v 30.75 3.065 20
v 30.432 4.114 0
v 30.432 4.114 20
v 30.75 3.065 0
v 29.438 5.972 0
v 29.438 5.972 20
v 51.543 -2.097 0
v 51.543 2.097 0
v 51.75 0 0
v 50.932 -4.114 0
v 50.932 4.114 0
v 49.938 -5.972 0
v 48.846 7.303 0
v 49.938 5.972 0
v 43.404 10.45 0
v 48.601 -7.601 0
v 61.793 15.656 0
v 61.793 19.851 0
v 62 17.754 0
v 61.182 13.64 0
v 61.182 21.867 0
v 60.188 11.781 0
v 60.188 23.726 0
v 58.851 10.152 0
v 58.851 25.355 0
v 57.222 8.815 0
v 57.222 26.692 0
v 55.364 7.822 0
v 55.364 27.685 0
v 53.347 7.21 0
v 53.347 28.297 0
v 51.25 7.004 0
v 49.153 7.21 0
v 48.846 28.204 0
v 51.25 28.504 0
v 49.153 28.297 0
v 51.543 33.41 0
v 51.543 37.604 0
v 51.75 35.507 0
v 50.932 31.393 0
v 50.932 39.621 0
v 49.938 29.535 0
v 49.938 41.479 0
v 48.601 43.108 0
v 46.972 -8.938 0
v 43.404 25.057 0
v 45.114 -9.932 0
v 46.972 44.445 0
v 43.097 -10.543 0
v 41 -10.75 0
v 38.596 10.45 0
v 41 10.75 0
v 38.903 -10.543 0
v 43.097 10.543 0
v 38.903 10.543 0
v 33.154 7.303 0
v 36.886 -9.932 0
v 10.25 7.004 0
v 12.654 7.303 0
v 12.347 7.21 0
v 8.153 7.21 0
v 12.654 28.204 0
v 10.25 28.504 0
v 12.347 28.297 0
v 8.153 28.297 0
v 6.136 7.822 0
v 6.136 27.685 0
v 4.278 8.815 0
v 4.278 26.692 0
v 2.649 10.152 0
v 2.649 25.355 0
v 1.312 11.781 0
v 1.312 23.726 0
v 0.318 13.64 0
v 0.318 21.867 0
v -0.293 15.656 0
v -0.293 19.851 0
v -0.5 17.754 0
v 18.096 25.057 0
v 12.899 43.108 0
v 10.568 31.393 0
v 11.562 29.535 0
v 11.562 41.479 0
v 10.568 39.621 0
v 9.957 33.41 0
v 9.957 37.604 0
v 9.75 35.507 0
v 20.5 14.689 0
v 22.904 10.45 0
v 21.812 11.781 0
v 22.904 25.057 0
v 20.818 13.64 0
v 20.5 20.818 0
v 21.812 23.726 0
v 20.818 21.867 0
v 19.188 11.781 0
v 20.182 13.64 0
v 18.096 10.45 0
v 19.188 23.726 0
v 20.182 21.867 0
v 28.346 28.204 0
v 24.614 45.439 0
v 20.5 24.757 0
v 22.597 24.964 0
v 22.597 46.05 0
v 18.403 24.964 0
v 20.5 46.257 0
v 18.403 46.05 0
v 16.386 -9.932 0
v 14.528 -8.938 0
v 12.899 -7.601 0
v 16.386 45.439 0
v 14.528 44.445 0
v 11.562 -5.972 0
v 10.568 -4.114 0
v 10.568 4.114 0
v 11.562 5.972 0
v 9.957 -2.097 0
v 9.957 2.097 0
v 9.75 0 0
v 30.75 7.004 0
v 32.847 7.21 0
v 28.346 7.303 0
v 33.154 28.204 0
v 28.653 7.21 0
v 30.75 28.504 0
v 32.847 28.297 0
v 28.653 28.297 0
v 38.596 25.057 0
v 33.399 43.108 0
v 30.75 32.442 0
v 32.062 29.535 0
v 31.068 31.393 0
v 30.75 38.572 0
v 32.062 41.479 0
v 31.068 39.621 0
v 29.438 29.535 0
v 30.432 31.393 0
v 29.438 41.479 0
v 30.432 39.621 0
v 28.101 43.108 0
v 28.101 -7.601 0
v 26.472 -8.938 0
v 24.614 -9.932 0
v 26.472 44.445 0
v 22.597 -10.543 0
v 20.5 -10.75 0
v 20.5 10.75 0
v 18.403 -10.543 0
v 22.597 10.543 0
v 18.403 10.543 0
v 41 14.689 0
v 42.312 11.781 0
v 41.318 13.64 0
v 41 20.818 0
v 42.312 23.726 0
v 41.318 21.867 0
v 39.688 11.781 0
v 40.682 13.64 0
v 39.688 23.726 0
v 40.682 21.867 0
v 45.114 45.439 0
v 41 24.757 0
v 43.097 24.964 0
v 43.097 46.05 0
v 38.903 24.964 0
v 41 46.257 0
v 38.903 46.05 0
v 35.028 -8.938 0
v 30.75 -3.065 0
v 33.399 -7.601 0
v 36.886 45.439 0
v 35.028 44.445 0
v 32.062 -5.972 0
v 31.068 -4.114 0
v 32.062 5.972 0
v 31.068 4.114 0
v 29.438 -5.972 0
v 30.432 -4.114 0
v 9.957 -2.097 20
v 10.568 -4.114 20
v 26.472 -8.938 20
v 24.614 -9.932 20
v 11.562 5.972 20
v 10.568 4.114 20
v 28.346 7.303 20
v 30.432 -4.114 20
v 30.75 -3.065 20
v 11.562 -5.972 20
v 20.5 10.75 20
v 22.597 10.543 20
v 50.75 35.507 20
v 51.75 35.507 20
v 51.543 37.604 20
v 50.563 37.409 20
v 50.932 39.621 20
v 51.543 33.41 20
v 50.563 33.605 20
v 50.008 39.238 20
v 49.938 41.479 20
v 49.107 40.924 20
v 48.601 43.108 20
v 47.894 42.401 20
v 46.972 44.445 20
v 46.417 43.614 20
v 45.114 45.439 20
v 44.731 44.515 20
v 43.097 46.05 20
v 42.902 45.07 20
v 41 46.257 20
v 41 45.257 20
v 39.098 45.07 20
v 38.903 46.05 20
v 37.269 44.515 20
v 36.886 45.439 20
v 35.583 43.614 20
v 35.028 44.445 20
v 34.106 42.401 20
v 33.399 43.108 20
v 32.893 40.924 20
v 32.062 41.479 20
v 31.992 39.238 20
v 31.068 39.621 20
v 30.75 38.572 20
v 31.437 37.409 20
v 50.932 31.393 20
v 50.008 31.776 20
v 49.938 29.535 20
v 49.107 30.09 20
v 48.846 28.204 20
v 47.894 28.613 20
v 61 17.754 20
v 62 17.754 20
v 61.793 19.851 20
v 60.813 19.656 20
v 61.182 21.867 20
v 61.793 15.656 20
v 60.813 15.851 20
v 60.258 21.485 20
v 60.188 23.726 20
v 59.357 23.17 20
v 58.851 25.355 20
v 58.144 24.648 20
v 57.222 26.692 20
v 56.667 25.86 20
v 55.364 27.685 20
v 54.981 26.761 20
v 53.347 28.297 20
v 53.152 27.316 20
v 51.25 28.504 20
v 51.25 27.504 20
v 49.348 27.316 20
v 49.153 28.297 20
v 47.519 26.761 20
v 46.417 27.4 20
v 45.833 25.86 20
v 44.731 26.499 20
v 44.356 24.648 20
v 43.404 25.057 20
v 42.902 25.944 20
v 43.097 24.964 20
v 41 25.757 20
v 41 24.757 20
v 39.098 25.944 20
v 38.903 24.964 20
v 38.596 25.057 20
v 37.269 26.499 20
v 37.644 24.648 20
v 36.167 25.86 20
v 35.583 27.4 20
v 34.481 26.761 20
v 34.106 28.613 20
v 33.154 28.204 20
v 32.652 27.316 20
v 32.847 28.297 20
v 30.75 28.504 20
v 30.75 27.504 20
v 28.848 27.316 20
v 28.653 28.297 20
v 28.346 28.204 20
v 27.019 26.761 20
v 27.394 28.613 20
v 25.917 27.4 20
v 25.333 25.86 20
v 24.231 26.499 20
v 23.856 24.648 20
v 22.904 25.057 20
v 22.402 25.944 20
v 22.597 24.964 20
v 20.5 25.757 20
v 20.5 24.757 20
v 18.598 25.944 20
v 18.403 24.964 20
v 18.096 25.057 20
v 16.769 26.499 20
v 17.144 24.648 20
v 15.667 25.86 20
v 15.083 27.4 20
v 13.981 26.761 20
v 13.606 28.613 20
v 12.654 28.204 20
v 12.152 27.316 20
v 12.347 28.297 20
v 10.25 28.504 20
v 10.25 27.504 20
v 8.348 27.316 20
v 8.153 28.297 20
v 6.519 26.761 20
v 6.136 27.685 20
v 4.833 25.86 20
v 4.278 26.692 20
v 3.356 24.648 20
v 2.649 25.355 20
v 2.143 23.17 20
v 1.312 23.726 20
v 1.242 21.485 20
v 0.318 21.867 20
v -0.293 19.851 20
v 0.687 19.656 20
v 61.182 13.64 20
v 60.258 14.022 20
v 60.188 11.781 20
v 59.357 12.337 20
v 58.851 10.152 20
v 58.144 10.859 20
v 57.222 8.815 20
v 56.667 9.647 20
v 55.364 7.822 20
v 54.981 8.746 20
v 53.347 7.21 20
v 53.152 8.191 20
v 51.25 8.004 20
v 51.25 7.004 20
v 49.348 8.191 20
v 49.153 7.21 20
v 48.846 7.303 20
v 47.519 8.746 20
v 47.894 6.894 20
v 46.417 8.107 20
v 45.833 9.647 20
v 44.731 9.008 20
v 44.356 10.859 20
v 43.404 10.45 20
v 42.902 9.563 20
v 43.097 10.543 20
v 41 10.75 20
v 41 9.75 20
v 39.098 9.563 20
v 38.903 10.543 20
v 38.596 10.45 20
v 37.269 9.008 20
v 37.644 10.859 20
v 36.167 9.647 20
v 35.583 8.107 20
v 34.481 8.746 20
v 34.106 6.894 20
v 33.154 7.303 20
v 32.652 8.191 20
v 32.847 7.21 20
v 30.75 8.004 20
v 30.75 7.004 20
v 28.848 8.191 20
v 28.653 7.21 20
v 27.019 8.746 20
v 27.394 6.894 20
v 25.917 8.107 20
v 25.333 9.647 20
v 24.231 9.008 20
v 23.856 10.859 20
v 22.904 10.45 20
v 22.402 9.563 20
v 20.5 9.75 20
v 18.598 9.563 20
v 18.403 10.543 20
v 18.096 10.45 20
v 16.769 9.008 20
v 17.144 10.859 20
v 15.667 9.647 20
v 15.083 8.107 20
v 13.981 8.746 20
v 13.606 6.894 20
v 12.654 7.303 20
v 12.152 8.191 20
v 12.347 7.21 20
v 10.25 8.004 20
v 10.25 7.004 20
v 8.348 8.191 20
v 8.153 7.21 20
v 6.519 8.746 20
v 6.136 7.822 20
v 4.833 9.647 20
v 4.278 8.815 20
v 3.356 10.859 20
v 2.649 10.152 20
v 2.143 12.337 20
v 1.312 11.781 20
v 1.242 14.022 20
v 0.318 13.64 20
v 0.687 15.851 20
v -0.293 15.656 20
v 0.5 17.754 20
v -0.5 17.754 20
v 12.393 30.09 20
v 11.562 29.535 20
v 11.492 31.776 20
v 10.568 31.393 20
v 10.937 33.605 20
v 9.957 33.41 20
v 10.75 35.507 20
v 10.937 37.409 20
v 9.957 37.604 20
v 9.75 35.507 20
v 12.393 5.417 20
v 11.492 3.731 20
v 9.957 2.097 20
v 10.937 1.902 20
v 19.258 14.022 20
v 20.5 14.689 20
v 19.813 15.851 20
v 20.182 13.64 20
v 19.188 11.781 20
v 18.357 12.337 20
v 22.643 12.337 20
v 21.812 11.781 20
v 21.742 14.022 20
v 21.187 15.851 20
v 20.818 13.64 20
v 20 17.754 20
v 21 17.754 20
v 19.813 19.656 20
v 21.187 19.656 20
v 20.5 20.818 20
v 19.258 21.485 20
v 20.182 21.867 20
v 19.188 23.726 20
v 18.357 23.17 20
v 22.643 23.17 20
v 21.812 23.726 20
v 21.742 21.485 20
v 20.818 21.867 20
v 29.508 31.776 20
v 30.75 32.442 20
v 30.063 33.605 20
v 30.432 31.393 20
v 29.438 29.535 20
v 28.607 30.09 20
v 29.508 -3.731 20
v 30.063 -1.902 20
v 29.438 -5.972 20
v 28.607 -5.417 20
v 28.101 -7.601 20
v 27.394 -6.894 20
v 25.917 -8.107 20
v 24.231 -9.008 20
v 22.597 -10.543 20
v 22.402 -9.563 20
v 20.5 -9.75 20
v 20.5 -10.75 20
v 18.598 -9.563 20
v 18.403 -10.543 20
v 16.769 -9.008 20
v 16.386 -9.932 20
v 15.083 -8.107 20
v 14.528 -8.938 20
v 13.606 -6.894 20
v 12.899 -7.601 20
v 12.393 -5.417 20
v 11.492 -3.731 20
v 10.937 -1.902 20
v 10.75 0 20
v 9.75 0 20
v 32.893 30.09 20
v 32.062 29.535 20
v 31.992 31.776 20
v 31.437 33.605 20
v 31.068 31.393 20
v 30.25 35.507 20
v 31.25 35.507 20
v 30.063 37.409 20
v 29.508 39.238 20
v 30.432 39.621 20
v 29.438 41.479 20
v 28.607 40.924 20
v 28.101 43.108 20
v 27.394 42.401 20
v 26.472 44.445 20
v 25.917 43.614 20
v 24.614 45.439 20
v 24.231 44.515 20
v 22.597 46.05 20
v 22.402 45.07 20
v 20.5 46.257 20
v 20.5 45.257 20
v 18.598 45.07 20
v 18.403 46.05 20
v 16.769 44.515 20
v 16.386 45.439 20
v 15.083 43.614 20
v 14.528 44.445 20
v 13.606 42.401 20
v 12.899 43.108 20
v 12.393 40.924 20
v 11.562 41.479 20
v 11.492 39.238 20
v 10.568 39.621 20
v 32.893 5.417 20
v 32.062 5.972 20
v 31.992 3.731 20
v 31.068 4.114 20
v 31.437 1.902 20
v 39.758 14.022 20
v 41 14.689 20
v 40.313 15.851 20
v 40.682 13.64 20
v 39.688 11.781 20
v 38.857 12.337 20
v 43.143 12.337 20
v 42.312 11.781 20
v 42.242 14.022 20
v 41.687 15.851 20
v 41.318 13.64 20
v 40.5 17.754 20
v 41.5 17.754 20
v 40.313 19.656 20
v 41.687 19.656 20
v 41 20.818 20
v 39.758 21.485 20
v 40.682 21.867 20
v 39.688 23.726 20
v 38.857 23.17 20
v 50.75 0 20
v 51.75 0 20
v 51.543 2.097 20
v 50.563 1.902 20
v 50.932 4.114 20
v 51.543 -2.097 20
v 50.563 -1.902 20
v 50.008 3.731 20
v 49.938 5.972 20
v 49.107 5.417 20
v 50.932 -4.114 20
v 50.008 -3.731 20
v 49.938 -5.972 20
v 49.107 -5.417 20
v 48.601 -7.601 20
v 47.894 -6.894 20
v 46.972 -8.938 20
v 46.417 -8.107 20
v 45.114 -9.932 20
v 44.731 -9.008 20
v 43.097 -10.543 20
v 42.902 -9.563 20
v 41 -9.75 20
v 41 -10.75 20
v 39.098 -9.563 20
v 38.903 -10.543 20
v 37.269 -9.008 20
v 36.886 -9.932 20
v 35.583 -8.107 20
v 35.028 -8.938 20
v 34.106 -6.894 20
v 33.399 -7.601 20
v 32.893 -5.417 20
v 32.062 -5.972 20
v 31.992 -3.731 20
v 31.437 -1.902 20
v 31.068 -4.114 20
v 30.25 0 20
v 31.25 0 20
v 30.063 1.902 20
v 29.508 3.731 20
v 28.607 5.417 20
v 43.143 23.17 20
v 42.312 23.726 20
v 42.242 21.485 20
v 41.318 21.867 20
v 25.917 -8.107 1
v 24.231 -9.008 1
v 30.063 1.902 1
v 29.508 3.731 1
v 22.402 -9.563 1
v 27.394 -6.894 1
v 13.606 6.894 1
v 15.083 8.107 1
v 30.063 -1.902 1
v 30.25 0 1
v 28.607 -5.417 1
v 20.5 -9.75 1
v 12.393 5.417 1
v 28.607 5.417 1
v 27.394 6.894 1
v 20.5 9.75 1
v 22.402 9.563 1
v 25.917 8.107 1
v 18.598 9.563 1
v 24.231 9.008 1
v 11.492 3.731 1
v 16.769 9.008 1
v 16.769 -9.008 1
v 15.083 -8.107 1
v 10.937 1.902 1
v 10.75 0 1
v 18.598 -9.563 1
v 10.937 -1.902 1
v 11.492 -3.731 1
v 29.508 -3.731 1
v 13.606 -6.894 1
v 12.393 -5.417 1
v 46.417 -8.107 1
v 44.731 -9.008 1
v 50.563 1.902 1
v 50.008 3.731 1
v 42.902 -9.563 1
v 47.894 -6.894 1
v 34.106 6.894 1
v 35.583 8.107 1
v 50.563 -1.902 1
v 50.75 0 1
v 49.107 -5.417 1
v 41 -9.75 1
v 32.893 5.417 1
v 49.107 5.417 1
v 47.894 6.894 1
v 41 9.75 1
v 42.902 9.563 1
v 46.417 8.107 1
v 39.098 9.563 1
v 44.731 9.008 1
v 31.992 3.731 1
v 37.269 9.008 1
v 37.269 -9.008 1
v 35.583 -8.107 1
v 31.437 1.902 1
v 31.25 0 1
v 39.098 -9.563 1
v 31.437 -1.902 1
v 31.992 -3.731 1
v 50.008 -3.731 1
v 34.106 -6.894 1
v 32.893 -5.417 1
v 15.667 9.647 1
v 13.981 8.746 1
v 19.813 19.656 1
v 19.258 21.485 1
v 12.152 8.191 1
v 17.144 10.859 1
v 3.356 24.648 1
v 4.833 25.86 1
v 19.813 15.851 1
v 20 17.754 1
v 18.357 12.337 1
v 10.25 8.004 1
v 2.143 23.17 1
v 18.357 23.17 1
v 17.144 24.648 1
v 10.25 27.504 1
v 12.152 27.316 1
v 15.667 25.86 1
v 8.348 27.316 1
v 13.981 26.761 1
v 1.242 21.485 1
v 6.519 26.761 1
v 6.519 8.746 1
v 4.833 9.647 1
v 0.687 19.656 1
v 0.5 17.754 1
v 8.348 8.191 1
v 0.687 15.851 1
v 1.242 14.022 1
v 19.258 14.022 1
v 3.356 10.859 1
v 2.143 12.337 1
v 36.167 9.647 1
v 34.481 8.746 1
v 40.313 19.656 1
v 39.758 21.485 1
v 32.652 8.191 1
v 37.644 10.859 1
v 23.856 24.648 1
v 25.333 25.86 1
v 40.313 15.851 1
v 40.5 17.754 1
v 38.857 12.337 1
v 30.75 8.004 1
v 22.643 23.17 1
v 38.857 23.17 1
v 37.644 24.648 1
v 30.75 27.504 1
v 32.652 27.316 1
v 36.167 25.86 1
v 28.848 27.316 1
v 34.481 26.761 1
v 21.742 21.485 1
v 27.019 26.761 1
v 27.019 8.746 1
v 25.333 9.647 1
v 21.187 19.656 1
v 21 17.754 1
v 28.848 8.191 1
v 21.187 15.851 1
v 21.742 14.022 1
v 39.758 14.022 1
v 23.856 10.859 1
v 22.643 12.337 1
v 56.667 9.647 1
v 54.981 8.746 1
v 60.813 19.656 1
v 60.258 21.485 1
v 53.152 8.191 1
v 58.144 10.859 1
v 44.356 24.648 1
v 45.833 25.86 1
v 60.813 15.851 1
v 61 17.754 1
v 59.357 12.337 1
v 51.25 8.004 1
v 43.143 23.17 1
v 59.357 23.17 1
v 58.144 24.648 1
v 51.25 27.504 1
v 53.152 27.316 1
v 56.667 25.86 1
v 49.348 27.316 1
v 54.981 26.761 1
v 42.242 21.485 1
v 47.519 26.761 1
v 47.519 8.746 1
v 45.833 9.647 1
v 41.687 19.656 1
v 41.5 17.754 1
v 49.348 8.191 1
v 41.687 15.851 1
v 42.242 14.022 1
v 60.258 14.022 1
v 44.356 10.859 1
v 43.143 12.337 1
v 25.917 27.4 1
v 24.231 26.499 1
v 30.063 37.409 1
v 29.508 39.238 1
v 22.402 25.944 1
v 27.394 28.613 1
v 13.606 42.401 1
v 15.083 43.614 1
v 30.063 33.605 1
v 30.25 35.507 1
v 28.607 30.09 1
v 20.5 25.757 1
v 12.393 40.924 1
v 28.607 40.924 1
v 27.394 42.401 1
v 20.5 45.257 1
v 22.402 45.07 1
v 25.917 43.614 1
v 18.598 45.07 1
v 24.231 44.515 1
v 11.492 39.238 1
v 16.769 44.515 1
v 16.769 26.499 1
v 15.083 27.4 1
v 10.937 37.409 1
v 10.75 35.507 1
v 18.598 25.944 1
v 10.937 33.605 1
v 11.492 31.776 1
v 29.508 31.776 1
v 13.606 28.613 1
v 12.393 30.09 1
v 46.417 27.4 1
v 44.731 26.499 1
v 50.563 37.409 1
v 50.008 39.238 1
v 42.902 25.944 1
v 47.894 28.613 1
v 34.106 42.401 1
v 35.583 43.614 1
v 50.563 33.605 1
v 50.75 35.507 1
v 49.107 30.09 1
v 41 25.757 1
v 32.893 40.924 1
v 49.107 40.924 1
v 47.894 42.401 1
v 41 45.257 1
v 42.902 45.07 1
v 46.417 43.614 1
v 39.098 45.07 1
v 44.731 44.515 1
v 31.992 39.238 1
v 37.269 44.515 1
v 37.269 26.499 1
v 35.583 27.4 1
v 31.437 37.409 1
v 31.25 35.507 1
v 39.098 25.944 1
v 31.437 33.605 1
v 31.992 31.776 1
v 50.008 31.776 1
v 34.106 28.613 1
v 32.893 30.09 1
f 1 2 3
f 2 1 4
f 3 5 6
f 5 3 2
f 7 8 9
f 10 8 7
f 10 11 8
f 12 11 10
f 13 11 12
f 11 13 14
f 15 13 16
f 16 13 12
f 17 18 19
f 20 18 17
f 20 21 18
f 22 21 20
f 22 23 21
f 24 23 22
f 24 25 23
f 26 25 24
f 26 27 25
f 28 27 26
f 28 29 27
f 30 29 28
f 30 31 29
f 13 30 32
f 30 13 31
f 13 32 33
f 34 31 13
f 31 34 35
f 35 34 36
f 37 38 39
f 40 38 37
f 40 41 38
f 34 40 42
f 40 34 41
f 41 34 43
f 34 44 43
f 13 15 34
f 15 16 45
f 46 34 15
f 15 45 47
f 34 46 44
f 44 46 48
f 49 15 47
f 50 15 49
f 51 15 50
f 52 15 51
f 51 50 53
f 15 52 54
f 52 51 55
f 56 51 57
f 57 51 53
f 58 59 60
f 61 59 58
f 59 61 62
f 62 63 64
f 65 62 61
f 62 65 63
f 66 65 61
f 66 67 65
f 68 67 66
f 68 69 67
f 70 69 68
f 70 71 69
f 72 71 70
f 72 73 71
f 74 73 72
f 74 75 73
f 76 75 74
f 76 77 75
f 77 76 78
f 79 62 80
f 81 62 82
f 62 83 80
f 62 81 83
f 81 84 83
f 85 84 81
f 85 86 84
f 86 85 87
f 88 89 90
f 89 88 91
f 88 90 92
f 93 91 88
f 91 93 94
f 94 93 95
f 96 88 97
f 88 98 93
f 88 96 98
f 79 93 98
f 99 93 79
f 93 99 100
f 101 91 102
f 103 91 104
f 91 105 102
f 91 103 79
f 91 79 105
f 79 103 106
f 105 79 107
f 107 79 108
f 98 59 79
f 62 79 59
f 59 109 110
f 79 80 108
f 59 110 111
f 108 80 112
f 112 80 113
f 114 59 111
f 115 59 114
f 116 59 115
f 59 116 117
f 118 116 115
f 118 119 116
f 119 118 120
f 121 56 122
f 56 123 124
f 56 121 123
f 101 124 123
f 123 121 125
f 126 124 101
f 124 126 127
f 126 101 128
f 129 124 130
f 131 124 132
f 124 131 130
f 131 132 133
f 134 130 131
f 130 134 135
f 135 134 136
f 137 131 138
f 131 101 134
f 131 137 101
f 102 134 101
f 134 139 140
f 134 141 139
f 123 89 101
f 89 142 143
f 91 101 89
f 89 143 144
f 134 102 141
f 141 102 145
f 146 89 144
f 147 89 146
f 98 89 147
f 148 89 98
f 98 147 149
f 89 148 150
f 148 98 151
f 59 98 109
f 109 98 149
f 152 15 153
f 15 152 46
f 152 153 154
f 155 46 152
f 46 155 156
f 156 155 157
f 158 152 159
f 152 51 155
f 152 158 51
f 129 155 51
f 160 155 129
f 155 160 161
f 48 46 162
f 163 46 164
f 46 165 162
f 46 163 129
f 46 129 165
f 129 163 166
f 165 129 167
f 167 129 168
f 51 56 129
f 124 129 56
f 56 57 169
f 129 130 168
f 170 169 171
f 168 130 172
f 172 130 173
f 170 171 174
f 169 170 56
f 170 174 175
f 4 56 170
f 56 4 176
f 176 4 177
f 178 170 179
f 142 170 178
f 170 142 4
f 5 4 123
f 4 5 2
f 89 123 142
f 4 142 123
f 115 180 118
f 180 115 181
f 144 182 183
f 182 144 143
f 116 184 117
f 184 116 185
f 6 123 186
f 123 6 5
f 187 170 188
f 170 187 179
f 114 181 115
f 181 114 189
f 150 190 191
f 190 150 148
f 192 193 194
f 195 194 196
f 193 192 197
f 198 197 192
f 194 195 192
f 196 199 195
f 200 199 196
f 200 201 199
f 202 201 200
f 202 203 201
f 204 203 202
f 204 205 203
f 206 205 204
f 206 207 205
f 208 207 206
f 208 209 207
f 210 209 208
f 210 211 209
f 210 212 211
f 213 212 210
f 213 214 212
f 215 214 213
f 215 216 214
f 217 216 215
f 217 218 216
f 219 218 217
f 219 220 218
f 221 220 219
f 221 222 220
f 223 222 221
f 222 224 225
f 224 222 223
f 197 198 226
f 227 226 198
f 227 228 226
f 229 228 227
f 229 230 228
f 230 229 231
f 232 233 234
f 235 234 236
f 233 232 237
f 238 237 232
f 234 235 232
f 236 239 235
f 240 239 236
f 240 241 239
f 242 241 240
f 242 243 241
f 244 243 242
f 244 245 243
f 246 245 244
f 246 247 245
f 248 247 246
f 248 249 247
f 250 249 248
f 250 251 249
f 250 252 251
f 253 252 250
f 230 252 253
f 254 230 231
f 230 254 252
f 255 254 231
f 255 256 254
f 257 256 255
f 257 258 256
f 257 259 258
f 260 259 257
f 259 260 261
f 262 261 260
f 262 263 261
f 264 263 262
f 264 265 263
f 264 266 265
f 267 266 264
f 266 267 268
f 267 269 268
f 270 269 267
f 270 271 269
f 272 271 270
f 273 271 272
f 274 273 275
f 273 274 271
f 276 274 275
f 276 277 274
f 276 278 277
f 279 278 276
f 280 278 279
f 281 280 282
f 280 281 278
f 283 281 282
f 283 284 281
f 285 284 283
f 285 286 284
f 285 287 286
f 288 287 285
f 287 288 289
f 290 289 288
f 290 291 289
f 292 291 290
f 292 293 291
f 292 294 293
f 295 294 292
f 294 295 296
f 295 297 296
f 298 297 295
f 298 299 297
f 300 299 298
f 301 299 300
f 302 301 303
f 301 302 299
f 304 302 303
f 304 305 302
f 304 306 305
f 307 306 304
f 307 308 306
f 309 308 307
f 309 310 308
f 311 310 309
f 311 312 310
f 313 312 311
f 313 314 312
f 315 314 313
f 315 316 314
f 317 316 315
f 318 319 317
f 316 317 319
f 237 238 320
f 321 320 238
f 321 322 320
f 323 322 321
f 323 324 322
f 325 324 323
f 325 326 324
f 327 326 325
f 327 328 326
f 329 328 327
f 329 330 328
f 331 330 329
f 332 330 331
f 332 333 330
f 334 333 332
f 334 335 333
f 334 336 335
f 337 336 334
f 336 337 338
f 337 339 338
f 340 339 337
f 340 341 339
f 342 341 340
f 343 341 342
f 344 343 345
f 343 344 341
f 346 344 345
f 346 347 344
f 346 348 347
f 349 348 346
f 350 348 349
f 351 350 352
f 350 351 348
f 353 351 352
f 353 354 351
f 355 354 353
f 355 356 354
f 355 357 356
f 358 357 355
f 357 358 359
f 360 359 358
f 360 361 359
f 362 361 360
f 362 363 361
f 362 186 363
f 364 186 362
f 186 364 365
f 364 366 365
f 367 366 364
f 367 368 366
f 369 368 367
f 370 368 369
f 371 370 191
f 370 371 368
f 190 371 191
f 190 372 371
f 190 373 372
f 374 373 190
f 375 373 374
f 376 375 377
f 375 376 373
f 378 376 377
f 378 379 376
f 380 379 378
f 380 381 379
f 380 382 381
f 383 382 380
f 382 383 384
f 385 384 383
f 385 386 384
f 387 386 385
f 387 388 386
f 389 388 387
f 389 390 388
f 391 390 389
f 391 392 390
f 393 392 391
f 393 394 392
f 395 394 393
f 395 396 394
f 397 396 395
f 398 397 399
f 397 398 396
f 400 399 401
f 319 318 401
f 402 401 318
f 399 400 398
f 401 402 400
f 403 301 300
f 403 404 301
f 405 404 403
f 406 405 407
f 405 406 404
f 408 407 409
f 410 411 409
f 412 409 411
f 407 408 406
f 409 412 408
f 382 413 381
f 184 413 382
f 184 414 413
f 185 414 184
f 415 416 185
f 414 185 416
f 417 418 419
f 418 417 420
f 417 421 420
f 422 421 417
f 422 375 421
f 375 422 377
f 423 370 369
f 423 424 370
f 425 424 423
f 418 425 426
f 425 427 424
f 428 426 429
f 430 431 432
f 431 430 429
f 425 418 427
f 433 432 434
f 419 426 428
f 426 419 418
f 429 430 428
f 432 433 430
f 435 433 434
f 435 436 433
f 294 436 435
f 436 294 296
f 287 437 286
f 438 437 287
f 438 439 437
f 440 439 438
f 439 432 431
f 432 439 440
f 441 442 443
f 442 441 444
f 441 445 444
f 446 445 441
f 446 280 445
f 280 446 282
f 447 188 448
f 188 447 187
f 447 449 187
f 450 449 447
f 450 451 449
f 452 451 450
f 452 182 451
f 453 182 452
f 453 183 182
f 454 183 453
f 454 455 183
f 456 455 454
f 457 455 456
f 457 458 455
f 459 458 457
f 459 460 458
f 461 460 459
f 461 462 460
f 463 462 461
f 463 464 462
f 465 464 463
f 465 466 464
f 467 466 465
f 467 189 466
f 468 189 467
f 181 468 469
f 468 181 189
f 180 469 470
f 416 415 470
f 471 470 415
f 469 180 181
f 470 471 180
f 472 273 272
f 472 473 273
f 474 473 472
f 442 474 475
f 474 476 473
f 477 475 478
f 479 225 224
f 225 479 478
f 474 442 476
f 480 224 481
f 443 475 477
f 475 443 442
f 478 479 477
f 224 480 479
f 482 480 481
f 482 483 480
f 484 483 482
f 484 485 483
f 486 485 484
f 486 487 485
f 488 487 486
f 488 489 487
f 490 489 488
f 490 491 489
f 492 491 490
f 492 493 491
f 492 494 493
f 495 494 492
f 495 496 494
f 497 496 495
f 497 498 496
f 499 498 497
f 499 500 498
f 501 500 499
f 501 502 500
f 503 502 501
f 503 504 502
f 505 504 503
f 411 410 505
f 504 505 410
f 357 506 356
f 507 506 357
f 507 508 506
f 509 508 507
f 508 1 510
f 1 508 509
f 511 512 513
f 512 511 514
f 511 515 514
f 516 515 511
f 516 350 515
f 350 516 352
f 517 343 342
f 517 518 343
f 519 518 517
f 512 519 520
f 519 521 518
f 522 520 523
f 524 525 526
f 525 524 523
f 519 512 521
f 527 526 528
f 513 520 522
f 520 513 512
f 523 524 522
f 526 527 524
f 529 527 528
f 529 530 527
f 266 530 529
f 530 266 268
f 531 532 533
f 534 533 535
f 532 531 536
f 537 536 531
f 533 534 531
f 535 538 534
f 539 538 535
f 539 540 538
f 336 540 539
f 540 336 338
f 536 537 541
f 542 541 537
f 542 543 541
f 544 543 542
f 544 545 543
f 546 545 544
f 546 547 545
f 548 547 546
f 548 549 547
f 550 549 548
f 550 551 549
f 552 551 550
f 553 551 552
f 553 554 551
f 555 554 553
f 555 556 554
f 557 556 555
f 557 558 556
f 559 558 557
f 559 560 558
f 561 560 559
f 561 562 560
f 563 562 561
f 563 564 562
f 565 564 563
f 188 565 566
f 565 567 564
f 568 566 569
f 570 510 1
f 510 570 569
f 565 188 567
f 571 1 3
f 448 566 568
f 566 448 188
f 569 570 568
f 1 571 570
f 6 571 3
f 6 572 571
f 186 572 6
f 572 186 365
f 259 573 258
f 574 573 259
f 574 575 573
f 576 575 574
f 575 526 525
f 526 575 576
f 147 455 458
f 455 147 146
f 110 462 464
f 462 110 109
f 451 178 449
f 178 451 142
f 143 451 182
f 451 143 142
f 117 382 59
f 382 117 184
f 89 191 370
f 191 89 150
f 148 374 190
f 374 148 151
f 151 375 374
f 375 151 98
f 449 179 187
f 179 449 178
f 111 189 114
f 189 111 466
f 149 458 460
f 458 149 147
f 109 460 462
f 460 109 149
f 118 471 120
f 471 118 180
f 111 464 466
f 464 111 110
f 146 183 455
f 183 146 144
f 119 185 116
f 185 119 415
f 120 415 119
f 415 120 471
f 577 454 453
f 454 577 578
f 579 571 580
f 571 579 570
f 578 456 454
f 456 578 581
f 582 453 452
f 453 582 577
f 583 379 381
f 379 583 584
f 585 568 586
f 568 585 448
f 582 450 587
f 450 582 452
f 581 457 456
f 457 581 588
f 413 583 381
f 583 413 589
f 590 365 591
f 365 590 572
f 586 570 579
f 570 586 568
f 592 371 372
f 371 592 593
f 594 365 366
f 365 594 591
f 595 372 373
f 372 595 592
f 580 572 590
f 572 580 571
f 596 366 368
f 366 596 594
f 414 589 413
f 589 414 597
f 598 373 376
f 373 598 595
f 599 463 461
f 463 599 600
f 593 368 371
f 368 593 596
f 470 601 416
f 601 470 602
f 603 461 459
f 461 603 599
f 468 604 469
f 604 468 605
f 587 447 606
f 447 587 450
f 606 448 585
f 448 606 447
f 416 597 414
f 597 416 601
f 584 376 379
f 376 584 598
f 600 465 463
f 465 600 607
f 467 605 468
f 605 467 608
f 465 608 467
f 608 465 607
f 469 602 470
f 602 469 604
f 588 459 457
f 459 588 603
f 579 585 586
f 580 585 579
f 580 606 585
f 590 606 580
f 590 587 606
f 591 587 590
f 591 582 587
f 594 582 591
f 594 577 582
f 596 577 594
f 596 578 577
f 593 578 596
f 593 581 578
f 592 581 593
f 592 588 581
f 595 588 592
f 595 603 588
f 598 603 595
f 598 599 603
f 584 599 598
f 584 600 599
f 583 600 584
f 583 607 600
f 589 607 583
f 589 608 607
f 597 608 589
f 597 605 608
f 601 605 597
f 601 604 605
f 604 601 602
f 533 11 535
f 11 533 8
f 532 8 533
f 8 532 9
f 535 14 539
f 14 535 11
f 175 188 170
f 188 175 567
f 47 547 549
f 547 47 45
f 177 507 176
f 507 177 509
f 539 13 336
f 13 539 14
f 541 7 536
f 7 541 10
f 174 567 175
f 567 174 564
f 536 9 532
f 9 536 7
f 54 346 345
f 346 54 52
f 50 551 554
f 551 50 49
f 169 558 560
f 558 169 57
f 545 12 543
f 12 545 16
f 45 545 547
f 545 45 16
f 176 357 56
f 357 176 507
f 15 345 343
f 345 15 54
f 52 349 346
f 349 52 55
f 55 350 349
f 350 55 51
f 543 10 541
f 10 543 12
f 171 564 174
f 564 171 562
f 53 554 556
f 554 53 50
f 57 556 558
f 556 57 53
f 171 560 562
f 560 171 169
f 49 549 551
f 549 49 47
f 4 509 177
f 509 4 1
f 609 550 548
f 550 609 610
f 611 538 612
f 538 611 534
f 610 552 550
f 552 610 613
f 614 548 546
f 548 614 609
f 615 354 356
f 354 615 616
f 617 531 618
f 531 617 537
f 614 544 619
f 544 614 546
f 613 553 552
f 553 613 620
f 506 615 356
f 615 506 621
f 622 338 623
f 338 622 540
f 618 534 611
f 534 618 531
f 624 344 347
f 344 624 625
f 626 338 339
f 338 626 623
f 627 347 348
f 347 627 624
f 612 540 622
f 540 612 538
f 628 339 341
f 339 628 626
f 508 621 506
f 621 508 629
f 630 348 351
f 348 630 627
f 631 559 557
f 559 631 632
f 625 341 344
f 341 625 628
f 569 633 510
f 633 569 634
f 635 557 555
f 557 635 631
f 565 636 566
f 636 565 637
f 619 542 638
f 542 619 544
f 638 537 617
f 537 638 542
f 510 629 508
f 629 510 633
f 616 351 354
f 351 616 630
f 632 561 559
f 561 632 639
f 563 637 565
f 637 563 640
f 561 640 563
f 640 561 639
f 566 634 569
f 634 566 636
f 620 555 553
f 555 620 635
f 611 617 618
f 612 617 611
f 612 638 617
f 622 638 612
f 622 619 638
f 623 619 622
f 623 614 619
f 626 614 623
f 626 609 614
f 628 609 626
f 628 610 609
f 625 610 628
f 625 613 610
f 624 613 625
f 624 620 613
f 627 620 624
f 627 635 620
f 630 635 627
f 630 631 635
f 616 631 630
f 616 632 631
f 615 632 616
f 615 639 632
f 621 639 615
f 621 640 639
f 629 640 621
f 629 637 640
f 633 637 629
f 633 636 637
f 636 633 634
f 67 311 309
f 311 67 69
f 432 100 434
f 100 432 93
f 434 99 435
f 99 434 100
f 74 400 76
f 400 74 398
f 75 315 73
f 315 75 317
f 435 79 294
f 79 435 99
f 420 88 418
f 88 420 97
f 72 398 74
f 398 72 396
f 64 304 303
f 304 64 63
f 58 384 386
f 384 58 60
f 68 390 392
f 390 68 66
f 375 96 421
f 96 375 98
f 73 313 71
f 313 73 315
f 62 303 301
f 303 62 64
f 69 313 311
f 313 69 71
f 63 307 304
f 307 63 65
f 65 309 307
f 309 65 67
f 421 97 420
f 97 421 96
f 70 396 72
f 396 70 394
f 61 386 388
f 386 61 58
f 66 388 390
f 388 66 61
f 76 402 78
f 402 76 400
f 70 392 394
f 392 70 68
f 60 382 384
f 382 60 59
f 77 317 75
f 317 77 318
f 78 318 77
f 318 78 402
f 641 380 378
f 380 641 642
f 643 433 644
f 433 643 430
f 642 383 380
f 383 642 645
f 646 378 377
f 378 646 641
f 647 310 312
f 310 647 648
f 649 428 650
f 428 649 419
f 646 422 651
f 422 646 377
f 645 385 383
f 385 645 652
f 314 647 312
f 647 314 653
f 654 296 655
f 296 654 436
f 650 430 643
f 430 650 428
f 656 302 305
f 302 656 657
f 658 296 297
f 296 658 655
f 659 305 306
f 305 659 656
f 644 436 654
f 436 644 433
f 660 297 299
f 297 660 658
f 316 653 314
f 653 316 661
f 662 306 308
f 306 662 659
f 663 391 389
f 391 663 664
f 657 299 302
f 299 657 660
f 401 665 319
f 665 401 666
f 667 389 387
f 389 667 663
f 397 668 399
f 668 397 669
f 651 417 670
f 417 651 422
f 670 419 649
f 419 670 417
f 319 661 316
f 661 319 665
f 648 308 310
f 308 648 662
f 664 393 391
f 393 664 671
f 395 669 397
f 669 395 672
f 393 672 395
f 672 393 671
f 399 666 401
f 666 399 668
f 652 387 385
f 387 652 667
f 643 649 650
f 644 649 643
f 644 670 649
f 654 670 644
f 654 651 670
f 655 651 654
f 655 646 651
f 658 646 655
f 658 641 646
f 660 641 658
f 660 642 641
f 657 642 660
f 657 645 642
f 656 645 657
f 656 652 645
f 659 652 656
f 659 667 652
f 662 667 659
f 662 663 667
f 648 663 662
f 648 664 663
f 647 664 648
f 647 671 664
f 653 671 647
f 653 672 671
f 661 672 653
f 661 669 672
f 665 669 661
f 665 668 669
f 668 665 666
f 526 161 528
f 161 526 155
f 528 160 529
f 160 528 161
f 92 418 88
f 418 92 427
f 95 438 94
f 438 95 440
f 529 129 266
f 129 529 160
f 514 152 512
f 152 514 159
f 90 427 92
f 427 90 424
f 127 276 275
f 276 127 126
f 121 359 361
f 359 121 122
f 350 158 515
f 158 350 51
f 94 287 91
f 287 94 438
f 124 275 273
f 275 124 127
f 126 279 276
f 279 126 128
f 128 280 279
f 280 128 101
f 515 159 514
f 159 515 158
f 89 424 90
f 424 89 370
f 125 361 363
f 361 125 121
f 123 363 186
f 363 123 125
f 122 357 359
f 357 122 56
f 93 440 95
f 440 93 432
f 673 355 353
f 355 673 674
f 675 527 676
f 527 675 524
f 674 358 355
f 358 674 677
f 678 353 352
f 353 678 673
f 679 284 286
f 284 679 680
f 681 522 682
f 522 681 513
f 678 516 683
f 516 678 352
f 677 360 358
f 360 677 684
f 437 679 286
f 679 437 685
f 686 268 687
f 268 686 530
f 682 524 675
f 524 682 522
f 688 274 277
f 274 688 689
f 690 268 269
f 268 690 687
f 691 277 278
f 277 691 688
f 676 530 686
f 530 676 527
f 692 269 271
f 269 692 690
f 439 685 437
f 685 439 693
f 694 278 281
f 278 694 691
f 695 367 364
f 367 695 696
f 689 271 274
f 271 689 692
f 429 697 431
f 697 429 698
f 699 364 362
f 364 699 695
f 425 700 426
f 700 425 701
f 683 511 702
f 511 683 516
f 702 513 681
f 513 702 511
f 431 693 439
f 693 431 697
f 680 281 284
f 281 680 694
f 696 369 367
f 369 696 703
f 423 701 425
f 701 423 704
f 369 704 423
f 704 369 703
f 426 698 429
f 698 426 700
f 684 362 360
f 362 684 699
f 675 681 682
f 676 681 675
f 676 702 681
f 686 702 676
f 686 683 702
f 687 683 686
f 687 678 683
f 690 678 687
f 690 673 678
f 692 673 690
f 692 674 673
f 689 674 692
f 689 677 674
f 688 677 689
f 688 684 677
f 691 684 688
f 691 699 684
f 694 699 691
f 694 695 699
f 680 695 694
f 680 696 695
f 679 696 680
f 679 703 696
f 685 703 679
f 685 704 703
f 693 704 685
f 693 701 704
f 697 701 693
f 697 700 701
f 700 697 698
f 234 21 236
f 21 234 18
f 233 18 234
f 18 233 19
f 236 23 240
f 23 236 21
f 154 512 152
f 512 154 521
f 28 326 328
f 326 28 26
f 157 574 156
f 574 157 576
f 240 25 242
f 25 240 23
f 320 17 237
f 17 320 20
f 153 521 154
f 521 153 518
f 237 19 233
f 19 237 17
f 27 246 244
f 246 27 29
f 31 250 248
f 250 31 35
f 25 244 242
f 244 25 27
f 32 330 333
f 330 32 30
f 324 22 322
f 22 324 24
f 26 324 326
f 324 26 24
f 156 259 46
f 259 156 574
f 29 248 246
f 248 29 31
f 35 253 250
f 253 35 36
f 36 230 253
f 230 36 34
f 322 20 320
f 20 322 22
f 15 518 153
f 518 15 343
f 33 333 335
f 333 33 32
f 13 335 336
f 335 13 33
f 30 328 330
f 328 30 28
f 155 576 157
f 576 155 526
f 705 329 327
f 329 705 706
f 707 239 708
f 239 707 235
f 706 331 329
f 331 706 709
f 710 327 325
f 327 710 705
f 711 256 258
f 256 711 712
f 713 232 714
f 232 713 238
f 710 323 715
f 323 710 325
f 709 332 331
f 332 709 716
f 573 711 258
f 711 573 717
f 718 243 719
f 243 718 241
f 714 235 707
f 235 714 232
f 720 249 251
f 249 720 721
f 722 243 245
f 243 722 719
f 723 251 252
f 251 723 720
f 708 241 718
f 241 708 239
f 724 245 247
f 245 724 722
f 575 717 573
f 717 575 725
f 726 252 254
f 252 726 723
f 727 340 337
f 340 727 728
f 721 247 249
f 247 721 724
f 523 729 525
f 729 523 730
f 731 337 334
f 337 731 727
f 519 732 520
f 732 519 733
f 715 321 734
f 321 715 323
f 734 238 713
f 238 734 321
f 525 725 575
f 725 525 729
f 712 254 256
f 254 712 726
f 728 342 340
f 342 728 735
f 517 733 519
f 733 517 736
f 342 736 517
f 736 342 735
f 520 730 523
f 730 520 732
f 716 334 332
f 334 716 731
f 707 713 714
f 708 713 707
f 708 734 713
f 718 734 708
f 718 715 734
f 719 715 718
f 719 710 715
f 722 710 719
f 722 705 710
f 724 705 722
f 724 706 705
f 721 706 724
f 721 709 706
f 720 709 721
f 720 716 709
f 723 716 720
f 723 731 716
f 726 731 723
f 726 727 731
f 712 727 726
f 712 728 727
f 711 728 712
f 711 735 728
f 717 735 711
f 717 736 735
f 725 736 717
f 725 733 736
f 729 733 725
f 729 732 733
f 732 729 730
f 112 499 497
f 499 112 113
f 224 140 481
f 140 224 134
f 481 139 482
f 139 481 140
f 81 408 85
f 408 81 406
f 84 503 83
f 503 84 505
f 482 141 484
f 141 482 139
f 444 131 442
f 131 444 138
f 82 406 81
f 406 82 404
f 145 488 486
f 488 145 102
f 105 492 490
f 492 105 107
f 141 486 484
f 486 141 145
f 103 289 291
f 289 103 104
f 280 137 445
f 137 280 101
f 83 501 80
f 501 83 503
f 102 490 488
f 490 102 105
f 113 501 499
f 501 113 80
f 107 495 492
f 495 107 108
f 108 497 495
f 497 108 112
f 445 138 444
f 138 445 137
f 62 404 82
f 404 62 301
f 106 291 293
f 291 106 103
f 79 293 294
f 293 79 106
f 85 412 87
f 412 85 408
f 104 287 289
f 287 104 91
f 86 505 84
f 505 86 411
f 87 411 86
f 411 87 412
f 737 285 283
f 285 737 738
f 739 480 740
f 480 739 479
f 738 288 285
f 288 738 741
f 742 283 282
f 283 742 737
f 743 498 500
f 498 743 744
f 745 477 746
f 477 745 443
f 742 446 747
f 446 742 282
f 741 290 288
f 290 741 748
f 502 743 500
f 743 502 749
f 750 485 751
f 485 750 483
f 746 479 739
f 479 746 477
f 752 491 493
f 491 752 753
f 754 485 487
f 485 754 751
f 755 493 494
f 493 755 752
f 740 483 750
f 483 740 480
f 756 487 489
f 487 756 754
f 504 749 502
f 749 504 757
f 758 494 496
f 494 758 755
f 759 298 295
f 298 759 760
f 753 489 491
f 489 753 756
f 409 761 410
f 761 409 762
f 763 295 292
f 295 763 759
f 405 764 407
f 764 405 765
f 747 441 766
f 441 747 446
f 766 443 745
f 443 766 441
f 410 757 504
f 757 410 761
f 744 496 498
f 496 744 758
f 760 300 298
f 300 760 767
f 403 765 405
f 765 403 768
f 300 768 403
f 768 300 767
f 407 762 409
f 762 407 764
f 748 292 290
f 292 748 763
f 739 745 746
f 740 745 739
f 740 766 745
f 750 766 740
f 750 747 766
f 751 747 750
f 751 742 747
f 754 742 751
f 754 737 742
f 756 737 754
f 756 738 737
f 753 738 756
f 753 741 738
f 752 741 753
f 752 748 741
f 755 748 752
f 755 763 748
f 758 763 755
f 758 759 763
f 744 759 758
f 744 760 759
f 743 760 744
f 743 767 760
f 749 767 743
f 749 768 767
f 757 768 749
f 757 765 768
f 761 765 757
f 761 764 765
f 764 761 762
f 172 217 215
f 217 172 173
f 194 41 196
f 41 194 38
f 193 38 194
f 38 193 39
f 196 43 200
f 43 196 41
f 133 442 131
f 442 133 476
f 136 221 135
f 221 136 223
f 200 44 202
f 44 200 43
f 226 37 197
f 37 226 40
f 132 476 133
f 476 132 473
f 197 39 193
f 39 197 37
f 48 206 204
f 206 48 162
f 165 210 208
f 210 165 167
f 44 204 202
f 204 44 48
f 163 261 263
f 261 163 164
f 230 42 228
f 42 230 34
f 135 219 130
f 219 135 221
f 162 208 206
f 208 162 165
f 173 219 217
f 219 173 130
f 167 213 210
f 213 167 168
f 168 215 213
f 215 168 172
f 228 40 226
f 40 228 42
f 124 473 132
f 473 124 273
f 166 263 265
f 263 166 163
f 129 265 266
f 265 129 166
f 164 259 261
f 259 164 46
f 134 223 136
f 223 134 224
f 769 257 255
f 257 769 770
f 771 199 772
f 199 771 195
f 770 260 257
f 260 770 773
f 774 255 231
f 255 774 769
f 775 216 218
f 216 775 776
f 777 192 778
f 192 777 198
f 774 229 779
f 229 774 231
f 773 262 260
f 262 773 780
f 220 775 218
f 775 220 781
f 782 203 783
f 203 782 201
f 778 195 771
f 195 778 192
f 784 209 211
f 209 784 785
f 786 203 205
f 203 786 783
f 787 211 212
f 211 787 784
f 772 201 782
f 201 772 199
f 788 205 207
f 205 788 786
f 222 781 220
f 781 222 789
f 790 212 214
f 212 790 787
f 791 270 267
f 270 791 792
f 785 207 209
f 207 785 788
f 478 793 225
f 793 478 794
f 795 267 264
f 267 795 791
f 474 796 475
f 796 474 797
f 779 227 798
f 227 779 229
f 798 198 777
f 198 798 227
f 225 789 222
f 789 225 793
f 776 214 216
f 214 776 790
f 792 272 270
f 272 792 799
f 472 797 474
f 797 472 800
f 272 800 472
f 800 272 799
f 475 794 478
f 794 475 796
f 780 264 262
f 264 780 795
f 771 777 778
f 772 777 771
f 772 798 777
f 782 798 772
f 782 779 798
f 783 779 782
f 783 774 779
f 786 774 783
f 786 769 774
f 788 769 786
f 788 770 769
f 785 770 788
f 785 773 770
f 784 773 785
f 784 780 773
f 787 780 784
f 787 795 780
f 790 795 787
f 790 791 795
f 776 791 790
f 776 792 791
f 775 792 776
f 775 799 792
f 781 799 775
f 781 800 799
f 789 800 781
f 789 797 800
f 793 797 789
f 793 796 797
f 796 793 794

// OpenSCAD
batr=9.75;
bh=1;
$fn=32;
module bat() {
cylinder(h=bh,r=batr+bh);
difference(){
cylinder(h=20,r=batr+bh);
cylinder(h=20,r=batr);
}
}
//bat(); //6

translate([batr+batr+bh,0,0]) bat();
translate([batr*4+bh*2,0,0]) bat();
lx=(batr*2+bh)*cos(60);
ly=(batr*2+bh)*sin(60);
translate([lx,ly,0]) {
bat();
translate([batr*2+bh,0,0]) bat();
translate([(batr*2+bh)*2,0,0]) bat();    //7
translate([lx,ly,0]) {
bat();
translate([batr*2+bh,0,0]) bat();  //7
}
}
